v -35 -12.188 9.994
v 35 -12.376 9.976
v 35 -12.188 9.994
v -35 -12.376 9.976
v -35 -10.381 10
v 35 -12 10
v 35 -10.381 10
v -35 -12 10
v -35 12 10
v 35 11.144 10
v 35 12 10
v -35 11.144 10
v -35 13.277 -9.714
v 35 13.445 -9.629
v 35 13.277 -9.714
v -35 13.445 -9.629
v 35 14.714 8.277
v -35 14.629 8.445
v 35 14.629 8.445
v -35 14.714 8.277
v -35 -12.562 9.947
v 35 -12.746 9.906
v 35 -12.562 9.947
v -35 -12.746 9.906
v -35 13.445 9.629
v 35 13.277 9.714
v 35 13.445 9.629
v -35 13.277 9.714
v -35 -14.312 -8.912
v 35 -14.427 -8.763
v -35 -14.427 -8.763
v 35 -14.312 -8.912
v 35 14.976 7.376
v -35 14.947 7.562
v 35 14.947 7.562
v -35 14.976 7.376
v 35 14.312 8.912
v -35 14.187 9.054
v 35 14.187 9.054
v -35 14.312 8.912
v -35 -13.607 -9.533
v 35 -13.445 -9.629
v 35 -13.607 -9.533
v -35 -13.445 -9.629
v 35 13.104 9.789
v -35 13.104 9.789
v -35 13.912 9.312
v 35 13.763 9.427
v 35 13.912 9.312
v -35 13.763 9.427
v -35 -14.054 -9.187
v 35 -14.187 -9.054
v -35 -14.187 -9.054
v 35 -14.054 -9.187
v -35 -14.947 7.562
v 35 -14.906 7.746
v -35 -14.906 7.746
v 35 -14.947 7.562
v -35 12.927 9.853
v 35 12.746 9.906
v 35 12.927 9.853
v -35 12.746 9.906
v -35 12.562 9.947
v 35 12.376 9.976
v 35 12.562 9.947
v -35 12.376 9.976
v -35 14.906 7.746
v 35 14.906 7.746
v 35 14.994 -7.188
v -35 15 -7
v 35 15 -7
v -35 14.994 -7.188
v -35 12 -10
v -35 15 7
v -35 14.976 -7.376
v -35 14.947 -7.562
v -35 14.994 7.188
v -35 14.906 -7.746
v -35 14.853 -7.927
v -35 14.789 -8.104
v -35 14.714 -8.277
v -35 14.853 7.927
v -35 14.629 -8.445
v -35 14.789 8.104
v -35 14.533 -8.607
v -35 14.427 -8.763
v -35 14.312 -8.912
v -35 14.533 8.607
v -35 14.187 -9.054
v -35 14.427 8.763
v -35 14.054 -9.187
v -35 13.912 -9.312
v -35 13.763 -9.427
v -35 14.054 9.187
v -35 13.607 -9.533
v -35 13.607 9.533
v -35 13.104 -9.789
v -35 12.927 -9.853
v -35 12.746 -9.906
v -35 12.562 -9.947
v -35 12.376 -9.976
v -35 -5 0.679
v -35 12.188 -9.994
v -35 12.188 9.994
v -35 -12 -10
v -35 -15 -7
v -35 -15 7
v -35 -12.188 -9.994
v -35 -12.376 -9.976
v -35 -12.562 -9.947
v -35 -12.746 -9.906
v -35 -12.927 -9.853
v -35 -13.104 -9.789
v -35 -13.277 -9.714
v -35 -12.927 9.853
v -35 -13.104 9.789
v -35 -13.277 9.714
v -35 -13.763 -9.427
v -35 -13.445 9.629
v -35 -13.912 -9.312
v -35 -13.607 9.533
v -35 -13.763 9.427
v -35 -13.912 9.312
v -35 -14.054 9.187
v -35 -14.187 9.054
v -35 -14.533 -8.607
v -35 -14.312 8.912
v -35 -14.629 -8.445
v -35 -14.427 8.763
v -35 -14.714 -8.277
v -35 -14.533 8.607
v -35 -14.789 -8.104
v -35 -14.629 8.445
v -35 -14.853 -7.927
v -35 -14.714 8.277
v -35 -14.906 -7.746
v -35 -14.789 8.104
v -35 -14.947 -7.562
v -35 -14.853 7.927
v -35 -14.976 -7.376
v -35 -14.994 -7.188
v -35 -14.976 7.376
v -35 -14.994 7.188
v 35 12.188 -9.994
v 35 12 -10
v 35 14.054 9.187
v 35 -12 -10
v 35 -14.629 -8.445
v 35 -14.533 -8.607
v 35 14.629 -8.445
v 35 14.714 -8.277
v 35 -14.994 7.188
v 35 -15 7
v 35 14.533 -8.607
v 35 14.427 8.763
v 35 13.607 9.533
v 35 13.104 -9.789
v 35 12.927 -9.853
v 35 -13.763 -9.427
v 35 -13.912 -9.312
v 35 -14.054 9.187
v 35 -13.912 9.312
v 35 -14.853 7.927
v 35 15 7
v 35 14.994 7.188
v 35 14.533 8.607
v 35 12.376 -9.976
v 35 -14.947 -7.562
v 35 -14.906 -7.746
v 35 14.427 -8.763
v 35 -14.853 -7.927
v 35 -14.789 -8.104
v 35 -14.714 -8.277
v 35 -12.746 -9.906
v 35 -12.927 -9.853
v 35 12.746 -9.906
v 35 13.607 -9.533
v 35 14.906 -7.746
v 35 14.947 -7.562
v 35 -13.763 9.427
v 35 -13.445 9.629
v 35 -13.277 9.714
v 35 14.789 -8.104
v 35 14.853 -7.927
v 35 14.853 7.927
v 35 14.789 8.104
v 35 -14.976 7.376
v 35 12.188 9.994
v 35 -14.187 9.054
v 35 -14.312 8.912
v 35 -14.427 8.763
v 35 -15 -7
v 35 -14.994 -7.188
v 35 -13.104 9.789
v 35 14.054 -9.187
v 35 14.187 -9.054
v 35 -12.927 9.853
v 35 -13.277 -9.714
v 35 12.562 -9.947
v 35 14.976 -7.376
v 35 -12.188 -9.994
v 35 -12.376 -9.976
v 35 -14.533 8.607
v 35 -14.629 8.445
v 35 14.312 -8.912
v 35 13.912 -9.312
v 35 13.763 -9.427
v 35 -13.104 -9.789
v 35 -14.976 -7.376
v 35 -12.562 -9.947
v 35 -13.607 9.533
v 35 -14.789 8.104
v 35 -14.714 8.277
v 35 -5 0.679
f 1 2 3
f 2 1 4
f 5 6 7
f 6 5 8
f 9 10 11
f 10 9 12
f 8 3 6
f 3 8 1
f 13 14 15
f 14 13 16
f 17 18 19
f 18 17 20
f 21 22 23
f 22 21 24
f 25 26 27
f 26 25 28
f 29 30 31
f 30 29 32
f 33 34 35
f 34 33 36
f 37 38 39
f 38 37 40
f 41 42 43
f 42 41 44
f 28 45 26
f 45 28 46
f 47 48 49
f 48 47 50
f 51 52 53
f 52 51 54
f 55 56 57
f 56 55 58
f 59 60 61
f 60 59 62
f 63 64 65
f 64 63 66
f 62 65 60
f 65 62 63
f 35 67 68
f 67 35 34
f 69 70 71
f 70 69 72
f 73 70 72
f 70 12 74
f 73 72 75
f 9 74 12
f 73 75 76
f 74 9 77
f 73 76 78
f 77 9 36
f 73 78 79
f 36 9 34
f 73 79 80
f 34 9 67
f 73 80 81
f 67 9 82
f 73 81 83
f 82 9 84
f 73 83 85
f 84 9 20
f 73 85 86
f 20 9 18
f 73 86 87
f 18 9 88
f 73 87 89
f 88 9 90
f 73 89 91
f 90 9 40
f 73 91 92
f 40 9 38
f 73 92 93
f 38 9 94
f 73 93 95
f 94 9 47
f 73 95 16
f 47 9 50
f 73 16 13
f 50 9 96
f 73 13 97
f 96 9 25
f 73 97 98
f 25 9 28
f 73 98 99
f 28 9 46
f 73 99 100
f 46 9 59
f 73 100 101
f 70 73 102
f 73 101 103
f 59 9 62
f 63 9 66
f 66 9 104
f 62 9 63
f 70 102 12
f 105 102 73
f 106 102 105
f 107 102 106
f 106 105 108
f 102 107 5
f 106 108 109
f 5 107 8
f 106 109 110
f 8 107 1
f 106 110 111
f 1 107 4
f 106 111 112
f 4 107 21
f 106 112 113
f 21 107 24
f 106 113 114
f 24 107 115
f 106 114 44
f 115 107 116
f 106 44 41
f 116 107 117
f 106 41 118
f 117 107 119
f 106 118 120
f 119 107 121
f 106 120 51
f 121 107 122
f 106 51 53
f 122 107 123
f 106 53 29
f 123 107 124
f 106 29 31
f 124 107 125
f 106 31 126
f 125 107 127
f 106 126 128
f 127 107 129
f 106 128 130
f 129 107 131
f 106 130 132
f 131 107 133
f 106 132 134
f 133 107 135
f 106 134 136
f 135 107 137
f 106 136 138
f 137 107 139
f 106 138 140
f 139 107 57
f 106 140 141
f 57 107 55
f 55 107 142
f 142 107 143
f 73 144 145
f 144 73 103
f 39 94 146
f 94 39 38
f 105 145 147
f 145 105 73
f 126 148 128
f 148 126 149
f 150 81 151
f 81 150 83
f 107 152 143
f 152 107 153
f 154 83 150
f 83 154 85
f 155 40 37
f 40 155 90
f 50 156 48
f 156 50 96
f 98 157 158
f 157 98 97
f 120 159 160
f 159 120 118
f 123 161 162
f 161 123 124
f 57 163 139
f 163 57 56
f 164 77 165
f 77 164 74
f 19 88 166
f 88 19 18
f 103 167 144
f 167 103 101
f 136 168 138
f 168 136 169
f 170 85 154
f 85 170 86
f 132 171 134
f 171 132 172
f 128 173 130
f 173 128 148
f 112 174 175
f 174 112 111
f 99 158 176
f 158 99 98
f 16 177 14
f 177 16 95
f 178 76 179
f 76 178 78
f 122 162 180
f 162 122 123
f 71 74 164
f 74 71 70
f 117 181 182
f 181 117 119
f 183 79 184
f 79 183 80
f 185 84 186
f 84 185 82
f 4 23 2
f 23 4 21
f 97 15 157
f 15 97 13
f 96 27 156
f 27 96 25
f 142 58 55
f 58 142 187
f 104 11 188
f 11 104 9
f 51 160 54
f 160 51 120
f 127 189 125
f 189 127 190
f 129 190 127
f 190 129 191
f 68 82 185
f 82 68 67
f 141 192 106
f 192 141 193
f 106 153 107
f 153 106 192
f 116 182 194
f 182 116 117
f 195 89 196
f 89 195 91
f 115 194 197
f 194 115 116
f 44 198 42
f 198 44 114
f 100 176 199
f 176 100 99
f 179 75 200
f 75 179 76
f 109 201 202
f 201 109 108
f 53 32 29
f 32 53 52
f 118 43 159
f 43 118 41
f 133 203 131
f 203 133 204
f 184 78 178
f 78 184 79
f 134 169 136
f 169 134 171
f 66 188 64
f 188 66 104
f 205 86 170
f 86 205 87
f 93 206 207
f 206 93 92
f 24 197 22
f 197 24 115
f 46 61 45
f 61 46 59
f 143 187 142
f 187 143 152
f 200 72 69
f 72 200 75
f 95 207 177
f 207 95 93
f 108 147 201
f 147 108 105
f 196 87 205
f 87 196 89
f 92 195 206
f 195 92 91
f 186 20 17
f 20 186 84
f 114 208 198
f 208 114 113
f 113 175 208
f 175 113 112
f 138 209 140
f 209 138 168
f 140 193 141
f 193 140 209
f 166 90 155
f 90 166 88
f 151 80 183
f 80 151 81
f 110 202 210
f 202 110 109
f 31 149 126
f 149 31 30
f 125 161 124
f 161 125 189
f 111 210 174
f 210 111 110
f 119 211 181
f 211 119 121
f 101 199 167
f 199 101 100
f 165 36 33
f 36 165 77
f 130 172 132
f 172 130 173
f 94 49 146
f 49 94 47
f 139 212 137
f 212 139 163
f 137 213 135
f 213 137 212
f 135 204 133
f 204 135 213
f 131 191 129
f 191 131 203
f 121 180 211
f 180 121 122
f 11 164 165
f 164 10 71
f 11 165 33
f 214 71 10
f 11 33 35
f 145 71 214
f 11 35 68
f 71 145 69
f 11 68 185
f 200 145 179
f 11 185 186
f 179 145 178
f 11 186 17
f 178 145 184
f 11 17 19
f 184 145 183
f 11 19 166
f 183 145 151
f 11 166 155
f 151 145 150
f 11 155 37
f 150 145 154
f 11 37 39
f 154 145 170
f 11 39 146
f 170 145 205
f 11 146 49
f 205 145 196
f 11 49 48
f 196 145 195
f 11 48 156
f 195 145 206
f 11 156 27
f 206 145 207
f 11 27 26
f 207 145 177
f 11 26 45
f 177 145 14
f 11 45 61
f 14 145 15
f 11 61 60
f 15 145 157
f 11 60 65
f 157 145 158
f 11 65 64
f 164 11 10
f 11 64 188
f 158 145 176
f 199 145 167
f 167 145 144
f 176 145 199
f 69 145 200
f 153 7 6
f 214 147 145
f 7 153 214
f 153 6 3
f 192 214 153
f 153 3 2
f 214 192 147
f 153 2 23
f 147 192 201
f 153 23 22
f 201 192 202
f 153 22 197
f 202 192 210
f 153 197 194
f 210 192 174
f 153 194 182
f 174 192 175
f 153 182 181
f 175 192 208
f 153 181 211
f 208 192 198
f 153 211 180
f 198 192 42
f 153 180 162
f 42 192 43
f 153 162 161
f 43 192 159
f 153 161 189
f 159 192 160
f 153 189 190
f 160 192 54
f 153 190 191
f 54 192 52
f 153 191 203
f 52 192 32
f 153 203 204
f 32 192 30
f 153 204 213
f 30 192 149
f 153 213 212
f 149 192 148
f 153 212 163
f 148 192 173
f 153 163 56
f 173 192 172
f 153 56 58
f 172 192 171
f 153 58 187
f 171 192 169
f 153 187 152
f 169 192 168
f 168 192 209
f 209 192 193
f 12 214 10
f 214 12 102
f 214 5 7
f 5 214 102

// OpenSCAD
difference() {
    color("red") translate([-35,0,0])  rotate([0,90,0]) linear_extrude(70) hull(){
        translate([7,12,0]) circle(r=3,$fn=100);
        translate([-7,12,0]) circle(r=3,$fn=100);
        translate([7,-12,0]) circle(r=3,$fn=100);
        translate([-7,-12,0]) circle(r=3,$fn=100);
    }
    translate([0,-15,18]) rotate([30,0,0]) translate([-75/2,0,0]) rotate([0,90,0]) linear_extrude(75) square([20,20]);
}
